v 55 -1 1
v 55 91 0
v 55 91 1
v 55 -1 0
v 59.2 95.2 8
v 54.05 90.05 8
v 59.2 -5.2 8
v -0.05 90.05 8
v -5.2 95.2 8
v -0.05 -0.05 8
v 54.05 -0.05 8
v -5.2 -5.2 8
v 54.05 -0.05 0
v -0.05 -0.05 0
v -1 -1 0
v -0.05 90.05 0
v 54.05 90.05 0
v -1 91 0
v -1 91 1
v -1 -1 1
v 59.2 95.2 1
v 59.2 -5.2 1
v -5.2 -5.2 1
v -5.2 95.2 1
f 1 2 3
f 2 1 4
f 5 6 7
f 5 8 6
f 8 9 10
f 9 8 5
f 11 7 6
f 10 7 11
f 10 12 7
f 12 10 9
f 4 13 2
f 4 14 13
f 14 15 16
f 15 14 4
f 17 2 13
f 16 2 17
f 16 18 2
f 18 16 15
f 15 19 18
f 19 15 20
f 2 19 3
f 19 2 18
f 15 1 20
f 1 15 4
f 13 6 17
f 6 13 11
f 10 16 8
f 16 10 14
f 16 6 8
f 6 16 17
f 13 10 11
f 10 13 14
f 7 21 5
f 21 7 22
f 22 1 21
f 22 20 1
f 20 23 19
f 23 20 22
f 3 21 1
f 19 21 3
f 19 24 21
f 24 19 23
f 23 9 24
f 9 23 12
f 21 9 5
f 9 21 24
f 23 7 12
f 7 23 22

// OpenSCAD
// Generated by SolidPython 1.1.1 on 2021-10-20 16:45:19


union() {
	difference() {
		translate(v = [-1.0000000000, -1.0000000000, 0]) {
			cube(size = [56.0000000000, 92.0000000000, 8]);
		}
		translate(v = [-0.0500000000, -0.0500000000, 0]) {
			cube(size = [54.1000000000, 90.1000000000, 8]);
		}
	}
	translate(v = [0, 0, 1]) {
		difference() {
			translate(v = [-5.2000000000, -5.2000000000, 0]) {
				cube(size = [64.4000000000, 100.4000000000, 7]);
			}
			translate(v = [-1.0000000000, -1.0000000000, 0]) {
				cube(size = [56.0000000000, 92.0000000000, 7]);
			}
		}
	}
}
